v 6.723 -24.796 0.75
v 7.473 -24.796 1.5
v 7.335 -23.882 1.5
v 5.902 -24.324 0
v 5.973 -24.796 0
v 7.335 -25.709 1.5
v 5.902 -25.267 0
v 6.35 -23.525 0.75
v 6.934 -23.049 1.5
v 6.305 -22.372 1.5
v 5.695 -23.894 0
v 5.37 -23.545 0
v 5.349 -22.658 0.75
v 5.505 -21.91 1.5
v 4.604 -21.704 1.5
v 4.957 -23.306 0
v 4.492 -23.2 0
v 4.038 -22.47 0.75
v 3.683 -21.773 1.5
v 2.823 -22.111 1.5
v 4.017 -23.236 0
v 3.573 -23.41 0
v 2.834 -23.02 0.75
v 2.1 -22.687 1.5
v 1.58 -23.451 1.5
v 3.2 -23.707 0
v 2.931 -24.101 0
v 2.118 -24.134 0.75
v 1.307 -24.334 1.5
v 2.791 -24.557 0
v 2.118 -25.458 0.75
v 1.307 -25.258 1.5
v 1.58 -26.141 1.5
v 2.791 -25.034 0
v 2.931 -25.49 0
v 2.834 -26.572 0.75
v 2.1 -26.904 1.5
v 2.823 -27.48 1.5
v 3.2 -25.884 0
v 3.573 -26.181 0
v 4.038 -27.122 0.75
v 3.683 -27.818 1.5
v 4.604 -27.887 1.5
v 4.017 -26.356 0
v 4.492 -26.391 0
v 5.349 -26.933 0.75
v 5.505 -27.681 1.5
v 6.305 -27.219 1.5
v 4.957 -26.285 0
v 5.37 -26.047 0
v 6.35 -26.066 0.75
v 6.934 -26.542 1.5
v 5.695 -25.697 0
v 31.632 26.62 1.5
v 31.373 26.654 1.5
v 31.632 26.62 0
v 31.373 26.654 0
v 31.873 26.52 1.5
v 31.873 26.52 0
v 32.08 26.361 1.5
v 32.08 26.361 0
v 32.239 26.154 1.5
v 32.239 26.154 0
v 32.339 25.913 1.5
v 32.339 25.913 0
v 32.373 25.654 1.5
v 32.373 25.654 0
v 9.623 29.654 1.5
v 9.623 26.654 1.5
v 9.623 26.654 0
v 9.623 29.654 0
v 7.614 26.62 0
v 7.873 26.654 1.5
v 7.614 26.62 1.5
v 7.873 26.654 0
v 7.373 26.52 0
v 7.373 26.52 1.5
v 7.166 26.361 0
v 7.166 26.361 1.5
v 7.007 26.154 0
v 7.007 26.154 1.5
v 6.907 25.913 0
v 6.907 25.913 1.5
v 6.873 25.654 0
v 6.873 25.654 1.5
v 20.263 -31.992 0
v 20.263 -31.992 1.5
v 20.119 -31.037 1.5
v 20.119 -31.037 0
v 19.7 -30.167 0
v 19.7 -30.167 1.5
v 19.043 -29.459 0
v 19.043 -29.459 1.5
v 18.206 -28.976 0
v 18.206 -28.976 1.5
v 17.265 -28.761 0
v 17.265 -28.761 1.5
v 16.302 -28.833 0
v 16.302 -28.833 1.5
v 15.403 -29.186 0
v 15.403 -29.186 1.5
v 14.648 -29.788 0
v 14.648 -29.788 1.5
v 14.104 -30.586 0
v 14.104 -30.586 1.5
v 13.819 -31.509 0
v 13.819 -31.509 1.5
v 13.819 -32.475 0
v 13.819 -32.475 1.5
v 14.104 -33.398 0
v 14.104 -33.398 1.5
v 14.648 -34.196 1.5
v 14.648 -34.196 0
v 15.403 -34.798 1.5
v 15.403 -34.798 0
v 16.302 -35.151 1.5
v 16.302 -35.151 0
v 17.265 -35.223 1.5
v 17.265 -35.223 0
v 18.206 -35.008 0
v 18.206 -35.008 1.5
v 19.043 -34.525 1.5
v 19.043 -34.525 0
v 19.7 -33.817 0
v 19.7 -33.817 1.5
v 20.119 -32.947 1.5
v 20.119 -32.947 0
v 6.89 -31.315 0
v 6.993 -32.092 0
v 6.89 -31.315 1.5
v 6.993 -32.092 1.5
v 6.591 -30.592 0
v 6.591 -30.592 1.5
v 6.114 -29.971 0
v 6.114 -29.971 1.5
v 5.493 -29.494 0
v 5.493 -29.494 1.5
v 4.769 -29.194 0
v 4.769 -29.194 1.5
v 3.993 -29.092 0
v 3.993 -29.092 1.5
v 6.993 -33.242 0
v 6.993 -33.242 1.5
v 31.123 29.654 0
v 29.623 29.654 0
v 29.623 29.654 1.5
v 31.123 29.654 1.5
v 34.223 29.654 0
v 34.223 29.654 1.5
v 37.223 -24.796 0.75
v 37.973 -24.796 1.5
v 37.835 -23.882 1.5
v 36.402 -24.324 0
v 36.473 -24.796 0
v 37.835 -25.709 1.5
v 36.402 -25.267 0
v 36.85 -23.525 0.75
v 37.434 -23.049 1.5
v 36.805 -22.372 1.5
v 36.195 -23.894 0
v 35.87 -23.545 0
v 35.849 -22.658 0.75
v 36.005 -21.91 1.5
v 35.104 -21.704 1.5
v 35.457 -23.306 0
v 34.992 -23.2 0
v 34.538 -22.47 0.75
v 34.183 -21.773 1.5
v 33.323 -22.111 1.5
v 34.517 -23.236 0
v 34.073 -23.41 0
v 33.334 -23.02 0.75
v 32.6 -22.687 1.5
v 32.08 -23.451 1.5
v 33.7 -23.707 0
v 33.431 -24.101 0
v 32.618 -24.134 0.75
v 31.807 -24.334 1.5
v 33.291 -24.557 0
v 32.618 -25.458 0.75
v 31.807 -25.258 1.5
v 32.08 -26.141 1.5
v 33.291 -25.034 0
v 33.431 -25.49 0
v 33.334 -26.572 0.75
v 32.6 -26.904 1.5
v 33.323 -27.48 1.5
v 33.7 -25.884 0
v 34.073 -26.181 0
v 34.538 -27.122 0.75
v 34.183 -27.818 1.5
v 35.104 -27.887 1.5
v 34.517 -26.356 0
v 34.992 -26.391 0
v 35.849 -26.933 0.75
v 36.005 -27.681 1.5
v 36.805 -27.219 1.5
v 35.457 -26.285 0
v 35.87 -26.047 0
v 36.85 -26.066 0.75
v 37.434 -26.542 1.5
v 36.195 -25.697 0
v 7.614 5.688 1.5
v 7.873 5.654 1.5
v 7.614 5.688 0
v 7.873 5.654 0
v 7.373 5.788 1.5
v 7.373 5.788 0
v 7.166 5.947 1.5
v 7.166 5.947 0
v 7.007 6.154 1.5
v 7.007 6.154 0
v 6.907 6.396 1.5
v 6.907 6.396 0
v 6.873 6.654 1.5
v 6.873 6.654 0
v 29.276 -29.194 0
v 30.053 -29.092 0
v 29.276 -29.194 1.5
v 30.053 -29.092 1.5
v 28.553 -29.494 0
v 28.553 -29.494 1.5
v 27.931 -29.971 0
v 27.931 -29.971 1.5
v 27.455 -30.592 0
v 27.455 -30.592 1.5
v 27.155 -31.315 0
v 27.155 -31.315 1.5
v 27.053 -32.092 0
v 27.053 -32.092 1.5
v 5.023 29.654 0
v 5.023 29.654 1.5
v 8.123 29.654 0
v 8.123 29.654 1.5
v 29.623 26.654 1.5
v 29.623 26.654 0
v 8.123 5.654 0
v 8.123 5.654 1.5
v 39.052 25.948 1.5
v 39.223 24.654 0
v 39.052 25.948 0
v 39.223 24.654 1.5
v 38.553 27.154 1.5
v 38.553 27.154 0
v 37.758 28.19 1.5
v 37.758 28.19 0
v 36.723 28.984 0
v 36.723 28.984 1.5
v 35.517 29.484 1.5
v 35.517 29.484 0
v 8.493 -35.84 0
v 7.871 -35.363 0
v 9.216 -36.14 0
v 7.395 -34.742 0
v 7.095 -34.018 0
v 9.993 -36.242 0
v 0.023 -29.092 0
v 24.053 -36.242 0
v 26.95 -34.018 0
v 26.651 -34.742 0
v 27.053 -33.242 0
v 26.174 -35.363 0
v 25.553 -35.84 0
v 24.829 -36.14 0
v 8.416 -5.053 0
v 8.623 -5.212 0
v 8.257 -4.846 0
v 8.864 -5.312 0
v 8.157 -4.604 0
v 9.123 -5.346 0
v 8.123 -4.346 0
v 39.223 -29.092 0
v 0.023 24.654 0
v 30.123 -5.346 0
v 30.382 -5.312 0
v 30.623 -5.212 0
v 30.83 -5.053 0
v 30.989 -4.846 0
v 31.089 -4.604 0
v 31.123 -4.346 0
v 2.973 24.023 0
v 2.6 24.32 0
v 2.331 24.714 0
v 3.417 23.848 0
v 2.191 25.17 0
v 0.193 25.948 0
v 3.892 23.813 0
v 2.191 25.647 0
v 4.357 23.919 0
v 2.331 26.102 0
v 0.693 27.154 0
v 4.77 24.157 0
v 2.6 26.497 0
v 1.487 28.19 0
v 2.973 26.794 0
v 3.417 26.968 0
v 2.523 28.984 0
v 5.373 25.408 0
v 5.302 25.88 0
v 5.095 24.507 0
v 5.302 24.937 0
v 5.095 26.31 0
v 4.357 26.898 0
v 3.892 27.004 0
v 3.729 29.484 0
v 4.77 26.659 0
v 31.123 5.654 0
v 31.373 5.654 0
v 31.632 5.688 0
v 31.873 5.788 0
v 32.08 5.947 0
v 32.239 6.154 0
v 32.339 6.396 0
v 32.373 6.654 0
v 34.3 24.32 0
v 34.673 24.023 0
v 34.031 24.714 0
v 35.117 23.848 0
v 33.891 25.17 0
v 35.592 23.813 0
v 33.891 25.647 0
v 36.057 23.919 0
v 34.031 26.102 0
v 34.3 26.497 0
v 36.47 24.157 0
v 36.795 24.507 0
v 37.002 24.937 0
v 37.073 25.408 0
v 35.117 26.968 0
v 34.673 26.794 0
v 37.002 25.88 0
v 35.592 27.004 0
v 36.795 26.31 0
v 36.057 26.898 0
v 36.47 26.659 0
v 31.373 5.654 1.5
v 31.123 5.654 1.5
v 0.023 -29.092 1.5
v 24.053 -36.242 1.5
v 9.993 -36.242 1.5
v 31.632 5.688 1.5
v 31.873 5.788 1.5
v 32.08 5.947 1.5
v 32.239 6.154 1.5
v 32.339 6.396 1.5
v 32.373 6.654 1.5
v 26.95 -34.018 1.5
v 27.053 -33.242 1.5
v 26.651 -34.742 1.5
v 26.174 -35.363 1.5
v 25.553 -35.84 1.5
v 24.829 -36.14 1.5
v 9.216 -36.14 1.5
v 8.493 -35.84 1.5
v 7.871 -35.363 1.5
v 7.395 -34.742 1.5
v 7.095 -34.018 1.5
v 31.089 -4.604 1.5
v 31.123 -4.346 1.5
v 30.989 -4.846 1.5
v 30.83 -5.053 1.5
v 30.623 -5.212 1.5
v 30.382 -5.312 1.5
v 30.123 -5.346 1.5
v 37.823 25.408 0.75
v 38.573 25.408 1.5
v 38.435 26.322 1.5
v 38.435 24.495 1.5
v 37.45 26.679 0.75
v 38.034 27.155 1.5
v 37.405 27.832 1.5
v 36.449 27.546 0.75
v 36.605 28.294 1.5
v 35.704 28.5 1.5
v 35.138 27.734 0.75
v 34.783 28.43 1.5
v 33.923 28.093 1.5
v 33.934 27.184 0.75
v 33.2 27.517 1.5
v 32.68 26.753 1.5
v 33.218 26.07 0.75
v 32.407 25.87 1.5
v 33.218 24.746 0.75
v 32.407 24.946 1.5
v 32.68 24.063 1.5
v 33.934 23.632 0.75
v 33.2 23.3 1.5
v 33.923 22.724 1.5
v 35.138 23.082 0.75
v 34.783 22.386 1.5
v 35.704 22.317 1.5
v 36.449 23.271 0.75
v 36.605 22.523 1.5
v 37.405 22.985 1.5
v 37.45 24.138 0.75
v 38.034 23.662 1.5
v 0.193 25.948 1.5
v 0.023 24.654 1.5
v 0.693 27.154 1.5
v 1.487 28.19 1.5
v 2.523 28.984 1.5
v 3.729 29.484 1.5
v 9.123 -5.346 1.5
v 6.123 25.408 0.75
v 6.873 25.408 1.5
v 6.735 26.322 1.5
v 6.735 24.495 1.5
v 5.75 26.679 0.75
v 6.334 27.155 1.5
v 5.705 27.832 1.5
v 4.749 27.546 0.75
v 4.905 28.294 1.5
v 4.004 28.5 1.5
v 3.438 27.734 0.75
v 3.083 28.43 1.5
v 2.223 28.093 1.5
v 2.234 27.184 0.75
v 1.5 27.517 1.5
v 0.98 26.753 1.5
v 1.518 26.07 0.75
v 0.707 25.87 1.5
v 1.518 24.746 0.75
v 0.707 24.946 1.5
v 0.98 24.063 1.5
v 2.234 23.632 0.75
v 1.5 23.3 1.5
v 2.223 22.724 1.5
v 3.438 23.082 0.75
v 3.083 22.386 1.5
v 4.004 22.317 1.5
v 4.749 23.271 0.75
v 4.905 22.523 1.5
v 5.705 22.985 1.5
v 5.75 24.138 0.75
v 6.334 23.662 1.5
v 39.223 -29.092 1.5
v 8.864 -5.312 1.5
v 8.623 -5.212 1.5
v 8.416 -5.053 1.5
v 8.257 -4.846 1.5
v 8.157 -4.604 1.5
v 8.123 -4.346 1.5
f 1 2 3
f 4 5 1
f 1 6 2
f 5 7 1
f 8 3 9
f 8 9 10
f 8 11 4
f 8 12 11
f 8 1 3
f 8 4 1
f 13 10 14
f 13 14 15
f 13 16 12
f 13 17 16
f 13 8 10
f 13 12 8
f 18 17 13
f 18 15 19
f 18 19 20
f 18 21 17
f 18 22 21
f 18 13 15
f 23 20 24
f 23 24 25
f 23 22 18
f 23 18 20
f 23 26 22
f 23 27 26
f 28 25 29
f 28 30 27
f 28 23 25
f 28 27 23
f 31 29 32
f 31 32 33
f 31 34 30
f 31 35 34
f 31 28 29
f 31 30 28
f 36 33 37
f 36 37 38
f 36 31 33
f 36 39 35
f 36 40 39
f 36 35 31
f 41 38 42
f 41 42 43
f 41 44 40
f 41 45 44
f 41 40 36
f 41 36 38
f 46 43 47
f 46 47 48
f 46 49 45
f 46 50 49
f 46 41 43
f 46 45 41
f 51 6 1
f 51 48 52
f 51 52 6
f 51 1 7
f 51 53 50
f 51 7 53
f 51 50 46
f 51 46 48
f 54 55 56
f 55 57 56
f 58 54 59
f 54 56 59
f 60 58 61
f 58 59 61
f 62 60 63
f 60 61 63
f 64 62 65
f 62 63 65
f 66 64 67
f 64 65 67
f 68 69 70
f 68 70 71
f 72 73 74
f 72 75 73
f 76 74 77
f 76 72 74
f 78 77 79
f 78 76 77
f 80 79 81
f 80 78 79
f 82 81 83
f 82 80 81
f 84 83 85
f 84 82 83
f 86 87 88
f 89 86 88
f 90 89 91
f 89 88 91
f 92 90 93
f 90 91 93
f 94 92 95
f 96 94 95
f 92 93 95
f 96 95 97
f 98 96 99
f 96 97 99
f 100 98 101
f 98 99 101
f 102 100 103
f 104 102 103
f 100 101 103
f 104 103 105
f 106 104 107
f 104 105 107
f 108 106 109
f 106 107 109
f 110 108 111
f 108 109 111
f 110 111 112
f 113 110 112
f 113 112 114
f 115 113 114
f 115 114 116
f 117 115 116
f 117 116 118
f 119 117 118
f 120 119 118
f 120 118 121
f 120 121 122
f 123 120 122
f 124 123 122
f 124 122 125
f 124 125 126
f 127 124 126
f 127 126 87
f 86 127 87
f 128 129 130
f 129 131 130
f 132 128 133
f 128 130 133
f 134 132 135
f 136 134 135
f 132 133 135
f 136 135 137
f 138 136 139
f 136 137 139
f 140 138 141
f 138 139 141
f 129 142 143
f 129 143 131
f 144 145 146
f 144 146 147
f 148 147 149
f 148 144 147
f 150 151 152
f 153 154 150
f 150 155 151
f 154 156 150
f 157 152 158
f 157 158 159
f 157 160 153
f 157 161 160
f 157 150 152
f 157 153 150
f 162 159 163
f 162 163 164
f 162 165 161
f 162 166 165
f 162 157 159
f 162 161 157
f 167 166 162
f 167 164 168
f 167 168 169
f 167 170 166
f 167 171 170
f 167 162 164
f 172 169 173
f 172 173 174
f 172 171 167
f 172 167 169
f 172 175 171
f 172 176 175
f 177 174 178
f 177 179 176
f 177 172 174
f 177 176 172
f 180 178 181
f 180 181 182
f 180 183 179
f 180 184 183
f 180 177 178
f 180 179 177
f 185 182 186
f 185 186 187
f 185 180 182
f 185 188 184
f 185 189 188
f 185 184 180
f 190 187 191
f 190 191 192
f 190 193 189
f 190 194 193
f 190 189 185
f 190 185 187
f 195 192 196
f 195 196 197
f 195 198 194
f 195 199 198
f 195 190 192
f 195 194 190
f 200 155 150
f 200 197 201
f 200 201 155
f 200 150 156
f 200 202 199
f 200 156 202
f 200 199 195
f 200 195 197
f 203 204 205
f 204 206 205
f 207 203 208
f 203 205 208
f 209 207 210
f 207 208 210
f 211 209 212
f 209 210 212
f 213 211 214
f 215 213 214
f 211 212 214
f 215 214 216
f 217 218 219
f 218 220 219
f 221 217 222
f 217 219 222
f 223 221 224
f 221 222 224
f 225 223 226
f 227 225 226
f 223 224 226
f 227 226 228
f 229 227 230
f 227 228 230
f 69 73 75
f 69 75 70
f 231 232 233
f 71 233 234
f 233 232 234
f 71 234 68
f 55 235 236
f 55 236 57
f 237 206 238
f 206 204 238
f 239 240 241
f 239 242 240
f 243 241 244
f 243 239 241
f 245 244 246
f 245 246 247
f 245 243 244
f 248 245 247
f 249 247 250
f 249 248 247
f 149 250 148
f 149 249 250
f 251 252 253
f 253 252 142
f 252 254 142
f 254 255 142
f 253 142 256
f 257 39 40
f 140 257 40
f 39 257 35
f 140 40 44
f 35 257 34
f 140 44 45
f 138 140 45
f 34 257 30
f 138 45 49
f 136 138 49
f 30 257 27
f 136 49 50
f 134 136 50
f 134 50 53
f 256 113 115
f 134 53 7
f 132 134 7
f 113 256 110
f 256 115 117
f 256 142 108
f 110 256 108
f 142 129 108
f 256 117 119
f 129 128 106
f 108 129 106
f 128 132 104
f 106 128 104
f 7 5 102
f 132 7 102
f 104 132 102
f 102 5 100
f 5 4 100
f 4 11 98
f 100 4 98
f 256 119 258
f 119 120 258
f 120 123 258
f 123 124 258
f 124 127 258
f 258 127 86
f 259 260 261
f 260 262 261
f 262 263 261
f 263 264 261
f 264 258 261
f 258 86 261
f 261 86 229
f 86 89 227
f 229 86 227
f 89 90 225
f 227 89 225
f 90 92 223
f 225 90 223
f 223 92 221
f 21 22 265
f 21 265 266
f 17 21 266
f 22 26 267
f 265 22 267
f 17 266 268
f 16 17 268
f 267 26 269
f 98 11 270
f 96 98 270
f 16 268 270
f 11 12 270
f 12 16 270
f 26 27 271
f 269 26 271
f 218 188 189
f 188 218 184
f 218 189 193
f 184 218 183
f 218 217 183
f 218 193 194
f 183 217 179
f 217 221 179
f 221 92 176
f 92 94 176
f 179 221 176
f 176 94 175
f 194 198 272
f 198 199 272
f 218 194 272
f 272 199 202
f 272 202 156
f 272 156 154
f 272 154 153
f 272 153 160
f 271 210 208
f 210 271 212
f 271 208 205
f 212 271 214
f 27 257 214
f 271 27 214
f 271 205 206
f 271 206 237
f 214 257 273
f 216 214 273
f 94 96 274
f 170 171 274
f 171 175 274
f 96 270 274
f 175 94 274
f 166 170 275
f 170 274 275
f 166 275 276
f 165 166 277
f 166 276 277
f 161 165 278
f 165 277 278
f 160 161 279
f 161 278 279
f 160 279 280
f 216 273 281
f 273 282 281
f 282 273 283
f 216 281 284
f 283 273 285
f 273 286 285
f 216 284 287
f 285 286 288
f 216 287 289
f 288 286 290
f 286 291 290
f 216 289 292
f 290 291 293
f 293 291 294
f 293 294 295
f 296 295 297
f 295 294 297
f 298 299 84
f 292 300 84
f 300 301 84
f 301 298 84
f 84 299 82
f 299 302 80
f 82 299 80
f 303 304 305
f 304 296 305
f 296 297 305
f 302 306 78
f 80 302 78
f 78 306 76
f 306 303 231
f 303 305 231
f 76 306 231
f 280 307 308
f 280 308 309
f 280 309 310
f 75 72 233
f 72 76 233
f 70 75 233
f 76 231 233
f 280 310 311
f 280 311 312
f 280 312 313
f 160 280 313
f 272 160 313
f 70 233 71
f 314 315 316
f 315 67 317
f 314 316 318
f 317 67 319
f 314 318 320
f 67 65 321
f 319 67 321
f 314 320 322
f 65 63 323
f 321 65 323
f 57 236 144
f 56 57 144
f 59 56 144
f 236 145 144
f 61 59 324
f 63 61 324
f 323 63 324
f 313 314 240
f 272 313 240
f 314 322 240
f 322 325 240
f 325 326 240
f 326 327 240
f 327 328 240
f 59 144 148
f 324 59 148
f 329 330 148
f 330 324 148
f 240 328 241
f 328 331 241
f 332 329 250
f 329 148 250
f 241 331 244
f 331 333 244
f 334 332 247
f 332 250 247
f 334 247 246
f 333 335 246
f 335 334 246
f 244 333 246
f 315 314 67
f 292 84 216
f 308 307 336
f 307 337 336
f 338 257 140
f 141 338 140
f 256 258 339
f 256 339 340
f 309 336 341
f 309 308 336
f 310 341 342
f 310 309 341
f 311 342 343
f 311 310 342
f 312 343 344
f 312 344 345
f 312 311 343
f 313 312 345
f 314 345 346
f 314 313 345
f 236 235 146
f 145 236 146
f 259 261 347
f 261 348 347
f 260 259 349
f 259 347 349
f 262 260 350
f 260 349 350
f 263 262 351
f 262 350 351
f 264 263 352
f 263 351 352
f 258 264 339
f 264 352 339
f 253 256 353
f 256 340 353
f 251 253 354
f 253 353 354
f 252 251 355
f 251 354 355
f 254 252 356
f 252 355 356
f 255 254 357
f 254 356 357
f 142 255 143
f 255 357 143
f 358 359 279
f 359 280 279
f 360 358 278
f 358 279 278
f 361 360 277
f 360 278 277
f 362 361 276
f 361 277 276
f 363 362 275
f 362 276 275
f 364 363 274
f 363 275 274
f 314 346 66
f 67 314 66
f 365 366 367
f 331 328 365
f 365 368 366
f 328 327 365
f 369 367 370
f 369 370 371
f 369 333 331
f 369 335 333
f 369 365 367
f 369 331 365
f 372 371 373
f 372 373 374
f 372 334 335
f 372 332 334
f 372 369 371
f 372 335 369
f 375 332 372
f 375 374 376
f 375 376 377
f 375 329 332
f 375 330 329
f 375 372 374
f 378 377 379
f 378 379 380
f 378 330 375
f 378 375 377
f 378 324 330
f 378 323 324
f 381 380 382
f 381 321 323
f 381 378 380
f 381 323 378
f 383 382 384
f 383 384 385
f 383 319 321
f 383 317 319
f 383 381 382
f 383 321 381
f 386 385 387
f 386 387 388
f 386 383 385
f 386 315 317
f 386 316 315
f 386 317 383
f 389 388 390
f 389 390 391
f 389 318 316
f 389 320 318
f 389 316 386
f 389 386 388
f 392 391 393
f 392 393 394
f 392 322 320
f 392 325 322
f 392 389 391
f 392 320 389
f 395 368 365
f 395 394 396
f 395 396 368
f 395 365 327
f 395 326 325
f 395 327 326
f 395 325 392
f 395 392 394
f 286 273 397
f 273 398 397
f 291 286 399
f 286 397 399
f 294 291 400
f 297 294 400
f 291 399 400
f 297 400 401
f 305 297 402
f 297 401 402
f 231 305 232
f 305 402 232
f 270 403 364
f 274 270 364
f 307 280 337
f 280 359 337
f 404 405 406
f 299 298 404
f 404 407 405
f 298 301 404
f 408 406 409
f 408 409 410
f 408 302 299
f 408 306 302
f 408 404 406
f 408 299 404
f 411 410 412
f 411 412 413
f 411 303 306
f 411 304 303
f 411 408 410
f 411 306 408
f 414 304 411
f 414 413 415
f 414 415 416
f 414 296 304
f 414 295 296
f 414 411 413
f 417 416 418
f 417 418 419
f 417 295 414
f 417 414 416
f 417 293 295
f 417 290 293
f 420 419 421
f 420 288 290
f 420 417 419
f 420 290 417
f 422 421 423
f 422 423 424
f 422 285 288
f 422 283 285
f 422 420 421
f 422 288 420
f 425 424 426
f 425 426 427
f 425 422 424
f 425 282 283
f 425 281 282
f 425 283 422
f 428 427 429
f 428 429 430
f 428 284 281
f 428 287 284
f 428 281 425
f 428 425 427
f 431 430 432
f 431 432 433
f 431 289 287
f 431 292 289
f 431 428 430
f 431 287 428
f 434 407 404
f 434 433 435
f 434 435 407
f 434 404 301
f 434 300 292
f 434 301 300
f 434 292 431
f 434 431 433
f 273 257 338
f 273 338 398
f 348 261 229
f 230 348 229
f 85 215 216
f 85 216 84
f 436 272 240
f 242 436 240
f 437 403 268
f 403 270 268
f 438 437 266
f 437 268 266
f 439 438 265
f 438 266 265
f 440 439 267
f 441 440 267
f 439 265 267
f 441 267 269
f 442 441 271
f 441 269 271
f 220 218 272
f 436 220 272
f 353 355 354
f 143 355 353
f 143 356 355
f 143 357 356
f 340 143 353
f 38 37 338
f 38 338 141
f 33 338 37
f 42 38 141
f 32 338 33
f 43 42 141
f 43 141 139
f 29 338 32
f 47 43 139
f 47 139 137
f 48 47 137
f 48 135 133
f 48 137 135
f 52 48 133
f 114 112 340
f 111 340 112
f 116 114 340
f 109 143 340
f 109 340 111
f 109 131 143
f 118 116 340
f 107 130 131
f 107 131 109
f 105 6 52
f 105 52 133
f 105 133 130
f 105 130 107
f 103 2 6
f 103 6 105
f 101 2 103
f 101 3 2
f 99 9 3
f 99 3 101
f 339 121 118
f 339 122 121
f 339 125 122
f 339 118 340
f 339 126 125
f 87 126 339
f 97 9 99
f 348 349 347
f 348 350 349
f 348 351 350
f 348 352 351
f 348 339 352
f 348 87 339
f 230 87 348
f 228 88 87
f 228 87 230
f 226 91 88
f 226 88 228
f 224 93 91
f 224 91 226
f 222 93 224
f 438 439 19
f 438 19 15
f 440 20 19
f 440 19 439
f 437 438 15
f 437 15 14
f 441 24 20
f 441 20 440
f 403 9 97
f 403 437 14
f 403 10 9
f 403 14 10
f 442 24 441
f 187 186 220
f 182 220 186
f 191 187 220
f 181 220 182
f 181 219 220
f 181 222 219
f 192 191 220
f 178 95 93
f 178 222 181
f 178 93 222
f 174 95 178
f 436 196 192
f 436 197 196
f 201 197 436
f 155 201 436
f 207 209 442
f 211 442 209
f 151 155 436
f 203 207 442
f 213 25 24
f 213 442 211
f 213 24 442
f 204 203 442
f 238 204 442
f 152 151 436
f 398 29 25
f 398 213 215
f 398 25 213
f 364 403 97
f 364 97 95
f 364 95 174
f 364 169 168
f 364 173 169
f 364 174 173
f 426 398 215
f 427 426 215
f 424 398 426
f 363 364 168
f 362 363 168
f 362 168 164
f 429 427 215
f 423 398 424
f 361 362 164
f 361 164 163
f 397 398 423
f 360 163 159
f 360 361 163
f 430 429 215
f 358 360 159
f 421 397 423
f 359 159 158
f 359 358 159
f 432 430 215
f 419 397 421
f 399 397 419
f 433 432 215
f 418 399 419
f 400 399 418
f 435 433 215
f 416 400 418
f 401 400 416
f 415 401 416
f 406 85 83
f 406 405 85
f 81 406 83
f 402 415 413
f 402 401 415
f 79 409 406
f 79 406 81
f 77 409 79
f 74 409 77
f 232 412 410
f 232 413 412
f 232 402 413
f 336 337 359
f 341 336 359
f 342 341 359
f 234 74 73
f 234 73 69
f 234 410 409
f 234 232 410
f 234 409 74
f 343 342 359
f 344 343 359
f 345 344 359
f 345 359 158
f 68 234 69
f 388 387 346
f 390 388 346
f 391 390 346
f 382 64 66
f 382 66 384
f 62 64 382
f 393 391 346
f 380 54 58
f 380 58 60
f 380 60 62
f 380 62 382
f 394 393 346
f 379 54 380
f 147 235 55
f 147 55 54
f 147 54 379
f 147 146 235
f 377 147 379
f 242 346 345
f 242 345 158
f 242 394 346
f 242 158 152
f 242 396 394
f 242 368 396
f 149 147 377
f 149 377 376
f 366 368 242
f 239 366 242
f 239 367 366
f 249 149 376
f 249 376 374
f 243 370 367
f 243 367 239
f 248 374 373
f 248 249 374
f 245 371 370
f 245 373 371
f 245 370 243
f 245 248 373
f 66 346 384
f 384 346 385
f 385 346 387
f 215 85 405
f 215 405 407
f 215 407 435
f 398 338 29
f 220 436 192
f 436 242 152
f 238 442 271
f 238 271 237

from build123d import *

# Parameters (mm, degrees)
SKETCH1_W                        = 39.2
SKETCH1_H                        = 58.746225757
BASE_DEPTH                       = 1.5
FRONT_FILLET_R                   = 5
BOLT_HOLE_CUT_REACH              = 51.194
SKETCH4_R                        = 1.6
BOLT_HEAD_CHAMBER_SIZE           = 1.5
CAMRA_HOLE_REACH                 = 51.194
SKETCH2_W                        = 23
SKETCH2_H                        = 21
SKETCH2_W_2                      = 1.25
SKETCH2_H_2                      = 3
SKETCH2_H_3                      = 8
SKETCH9_W                        = 1.5
SKETCH9_H                        = 3
CAMERA_SIDE_MOUNT_HOLDER_DEPTH   = 1.5
FILLET1_R                        = 1
SKETCH12_W                       = 20.06
SKETCH12_H                       = 7.149851194
ANTENNA_CONNECTOR_TOP_BASE_DEPTH = 1.5
ANTENNA_CONNECTOR_TOP_CUT_REACH  = 55.424
SKETCH13_R                       = 3.24
ANTENNA_TOP_CONNECTOR_FILLET_R   = 3
FILLET2_R                        = 1


with BuildPart() as part:
    # Sketch1 → Base (new body)
    with BuildSketch(Plane.XY):
        with Locations((19.622719192, 0.281239742)):
            Rectangle(SKETCH1_W, SKETCH1_H)
    extrude(amount=BASE_DEPTH)

    # Front fillet
    front_fillet_edges = [part.edges().sort_by_distance(p)[0] for p in [
        (0.022719192, 29.65435262, 0.75),
        (39.222719192, 29.65435262, 0.75),
    ]]
    fillet(front_fillet_edges, radius=FRONT_FILLET_R)

    # Sketch4 → Bolt hole cut (cut, up to next)
    with BuildSketch(Plane.XY.offset(1.5), mode=Mode.PRIVATE) as bolt_hole_cut_sk1:
        with Locations((34.872719192, -24.79564738)):
            Circle(SKETCH4_R)
    bolt_hole_cut_tool1 = extrude(bolt_hole_cut_sk1.sketch, amount=-BOLT_HOLE_CUT_REACH, mode=Mode.PRIVATE) & part.part
    # Sketch4 → Bolt hole cut (cut, up to next)
    with BuildSketch(Plane.XY.offset(1.5), mode=Mode.PRIVATE) as bolt_hole_cut_sk2:
        with Locations((4.372719192, -24.79564738)):
            Circle(SKETCH4_R)
    bolt_hole_cut_tool2 = extrude(bolt_hole_cut_sk2.sketch, amount=-BOLT_HOLE_CUT_REACH, mode=Mode.PRIVATE) & part.part
    # Sketch4 → Bolt hole cut (cut, up to next)
    with BuildSketch(Plane.XY.offset(1.5), mode=Mode.PRIVATE) as bolt_hole_cut_sk3:
        with Locations((3.772719192, 25.408275669)):
            Circle(SKETCH4_R)
    bolt_hole_cut_tool3 = extrude(bolt_hole_cut_sk3.sketch, amount=-BOLT_HOLE_CUT_REACH, mode=Mode.PRIVATE) & part.part
    # Sketch4 → Bolt hole cut (cut, up to next)
    with BuildSketch(Plane.XY.offset(1.5), mode=Mode.PRIVATE) as bolt_hole_cut_sk4:
        with Locations((35.472719192, 25.408275669)):
            Circle(SKETCH4_R)
    bolt_hole_cut_tool4 = extrude(bolt_hole_cut_sk4.sketch, amount=-BOLT_HOLE_CUT_REACH, mode=Mode.PRIVATE) & part.part
    add(bolt_hole_cut_tool1.solids().sort_by_distance((34.872719, -24.795647, 1.5))[0], mode=Mode.SUBTRACT)
    add(bolt_hole_cut_tool2.solids().sort_by_distance((4.372719, -24.795647, 1.5))[0], mode=Mode.SUBTRACT)
    add(bolt_hole_cut_tool3.solids().sort_by_distance((3.772719, 25.408276, 1.5))[0], mode=Mode.SUBTRACT)
    add(bolt_hole_cut_tool4.solids().sort_by_distance((35.472719, 25.408276, 1.5))[0], mode=Mode.SUBTRACT)

    # Bolt head chamber
    bolt_head_chamber_edges = [part.edges().sort_by_distance(p)[0] for p in [
        (33.272719192, -24.79564738, 1.5),
        (2.772719192, -24.79564738, 1.5),
        (2.172719192, 25.408275669, 1.5),
        (33.872719192, 25.408275669, 1.5),
    ]]
    chamfer(bolt_head_chamber_edges, length=BOLT_HEAD_CHAMBER_SIZE - 0.0001)  # a hair under: the kernel refuses the full size

    # Sketch2 → Camra hole (cut, up to next)
    with BuildSketch(Plane.XY.offset(1.5), mode=Mode.PRIVATE) as camra_hole_sk1:
        with Locations((19.622719192, 16.15435262)):
            Rectangle(SKETCH2_W, SKETCH2_H)
    camra_hole_tool1 = extrude(camra_hole_sk1.sketch, amount=-CAMRA_HOLE_REACH, mode=Mode.PRIVATE) & part.part
    # Sketch2 → Camra hole (cut, up to next)
    with BuildSketch(Plane.XY.offset(1.5), mode=Mode.PRIVATE) as camra_hole_sk2:
        with Locations((7.497719192, 16.15435262)):
            Rectangle(SKETCH2_W_2, SKETCH2_H)
    camra_hole_tool2 = extrude(camra_hole_sk2.sketch, amount=-CAMRA_HOLE_REACH, mode=Mode.PRIVATE) & part.part
    # Sketch2 → Camra hole (cut, up to next)
    with BuildSketch(Plane.XY.offset(1.5), mode=Mode.PRIVATE) as camra_hole_sk3:
        with Locations((31.747719192, 16.15435262)):
            Rectangle(SKETCH2_W_2, SKETCH2_H)
    camra_hole_tool3 = extrude(camra_hole_sk3.sketch, amount=-CAMRA_HOLE_REACH, mode=Mode.PRIVATE) & part.part
    # Sketch2 → Camra hole (cut, up to next)
    with BuildSketch(Plane.XY.offset(1.5), mode=Mode.PRIVATE) as camra_hole_sk4:
        with Locations((19.622719192, 4.15435262)):
            Rectangle(SKETCH2_W, SKETCH2_H_2)
    camra_hole_tool4 = extrude(camra_hole_sk4.sketch, amount=-CAMRA_HOLE_REACH, mode=Mode.PRIVATE) & part.part
    # Sketch2 → Camra hole (cut, up to next)
    with BuildSketch(Plane.XY.offset(1.5), mode=Mode.PRIVATE) as camra_hole_sk5:
        with Locations((19.622719192, -1.34564738)):
            Rectangle(SKETCH2_W, SKETCH2_H_3)
    camra_hole_tool5 = extrude(camra_hole_sk5.sketch, amount=-CAMRA_HOLE_REACH, mode=Mode.PRIVATE) & part.part
    # Sketch2 → Camra hole (cut, up to next)
    with BuildSketch(Plane.XY.offset(1.5), mode=Mode.PRIVATE) as camra_hole_sk6:
        with Locations((19.622719192, 28.15435262)):
            Rectangle(SKETCH2_W, SKETCH2_H_2)
    camra_hole_tool6 = extrude(camra_hole_sk6.sketch, amount=-CAMRA_HOLE_REACH, mode=Mode.PRIVATE) & part.part
    add(camra_hole_tool1.solids().sort_by_distance((19.622719, 16.154353, 1.5))[0], mode=Mode.SUBTRACT)
    add(camra_hole_tool2.solids().sort_by_distance((7.497719, 16.154353, 1.5))[0], mode=Mode.SUBTRACT)
    add(camra_hole_tool3.solids().sort_by_distance((31.747719, 16.154353, 1.5))[0], mode=Mode.SUBTRACT)
    add(camra_hole_tool4.solids().sort_by_distance((19.622719, 4.154353, 1.5))[0], mode=Mode.SUBTRACT)
    add(camra_hole_tool5.solids().sort_by_distance((19.622719, -1.345647, 1.5))[0], mode=Mode.SUBTRACT)
    add(camra_hole_tool6.solids().sort_by_distance((19.622719, 28.154353, 1.5))[0], mode=Mode.SUBTRACT)

    # Sketch9 → Camera side mount holder (add)
    with BuildSketch(Plane.XY.offset(1.5)):
        with Locations((8.872719192, 28.15435262)):
            Rectangle(SKETCH9_W, SKETCH9_H)
        with Locations((30.372719192, 28.15435262)):
            Rectangle(SKETCH9_W, SKETCH9_H)
    extrude(amount=-CAMERA_SIDE_MOUNT_HOLDER_DEPTH)

    # Fillet1
    fillet1_edges = [part.edges().sort_by_distance(p)[0] for p in [
        (32.372719192, 5.65435262, 0.75),
        (6.872719192, 5.65435262, 0.75),
    ]]
    fillet(fillet1_edges, radius=FILLET1_R)

    # Sketch12 → Antenna connector top base (add)
    with BuildSketch(Plane(origin=(0, 0, 0), x_dir=(-1, 0, 0), z_dir=(0, 0, -1))):
        with Locations((-17.022719192, -32.666798734)):
            Rectangle(SKETCH12_W, SKETCH12_H)
    extrude(amount=-ANTENNA_CONNECTOR_TOP_BASE_DEPTH)

    # Sketch13 → Antenna connector top cut (cut, up to next)
    with BuildSketch(Plane.XY.offset(1.5), mode=Mode.PRIVATE) as antenna_connector_top_cut_sk1:
        with Locations((17.022719192, -31.991873137)):
            Circle(SKETCH13_R)
    antenna_connector_top_cut_tool1 = extrude(antenna_connector_top_cut_sk1.sketch, amount=-ANTENNA_CONNECTOR_TOP_CUT_REACH, mode=Mode.PRIVATE) & part.part
    add(antenna_connector_top_cut_tool1.solids().sort_by_distance((17.022719, -31.991873, 1.5))[0], mode=Mode.SUBTRACT)

    # Antenna top connector fillet
    antenna_top_connector_fillet_edges = [part.edges().sort_by_distance(p)[0] for p in [
        (27.052719192, -29.091873137, 0.75),
        (27.052719192, -36.241724331, 0.75),
        (6.992719192, -36.241724331, 0.75),
        (6.992719192, -29.091873137, 0.75),
    ]]
    fillet(antenna_top_connector_fillet_edges, radius=ANTENNA_TOP_CONNECTOR_FILLET_R)

    # Fillet2
    fillet2_edges = [part.edges().sort_by_distance(p)[0] for p in [
        (32.372719192, 26.65435262, 0.75),
        (31.122719192, -5.34564738, 0.75),
        (8.122719192, -5.34564738, 0.75),
        (6.872719192, 26.65435262, 0.75),
    ]]
    fillet(fillet2_edges, radius=FILLET2_R)


solid = part.part
